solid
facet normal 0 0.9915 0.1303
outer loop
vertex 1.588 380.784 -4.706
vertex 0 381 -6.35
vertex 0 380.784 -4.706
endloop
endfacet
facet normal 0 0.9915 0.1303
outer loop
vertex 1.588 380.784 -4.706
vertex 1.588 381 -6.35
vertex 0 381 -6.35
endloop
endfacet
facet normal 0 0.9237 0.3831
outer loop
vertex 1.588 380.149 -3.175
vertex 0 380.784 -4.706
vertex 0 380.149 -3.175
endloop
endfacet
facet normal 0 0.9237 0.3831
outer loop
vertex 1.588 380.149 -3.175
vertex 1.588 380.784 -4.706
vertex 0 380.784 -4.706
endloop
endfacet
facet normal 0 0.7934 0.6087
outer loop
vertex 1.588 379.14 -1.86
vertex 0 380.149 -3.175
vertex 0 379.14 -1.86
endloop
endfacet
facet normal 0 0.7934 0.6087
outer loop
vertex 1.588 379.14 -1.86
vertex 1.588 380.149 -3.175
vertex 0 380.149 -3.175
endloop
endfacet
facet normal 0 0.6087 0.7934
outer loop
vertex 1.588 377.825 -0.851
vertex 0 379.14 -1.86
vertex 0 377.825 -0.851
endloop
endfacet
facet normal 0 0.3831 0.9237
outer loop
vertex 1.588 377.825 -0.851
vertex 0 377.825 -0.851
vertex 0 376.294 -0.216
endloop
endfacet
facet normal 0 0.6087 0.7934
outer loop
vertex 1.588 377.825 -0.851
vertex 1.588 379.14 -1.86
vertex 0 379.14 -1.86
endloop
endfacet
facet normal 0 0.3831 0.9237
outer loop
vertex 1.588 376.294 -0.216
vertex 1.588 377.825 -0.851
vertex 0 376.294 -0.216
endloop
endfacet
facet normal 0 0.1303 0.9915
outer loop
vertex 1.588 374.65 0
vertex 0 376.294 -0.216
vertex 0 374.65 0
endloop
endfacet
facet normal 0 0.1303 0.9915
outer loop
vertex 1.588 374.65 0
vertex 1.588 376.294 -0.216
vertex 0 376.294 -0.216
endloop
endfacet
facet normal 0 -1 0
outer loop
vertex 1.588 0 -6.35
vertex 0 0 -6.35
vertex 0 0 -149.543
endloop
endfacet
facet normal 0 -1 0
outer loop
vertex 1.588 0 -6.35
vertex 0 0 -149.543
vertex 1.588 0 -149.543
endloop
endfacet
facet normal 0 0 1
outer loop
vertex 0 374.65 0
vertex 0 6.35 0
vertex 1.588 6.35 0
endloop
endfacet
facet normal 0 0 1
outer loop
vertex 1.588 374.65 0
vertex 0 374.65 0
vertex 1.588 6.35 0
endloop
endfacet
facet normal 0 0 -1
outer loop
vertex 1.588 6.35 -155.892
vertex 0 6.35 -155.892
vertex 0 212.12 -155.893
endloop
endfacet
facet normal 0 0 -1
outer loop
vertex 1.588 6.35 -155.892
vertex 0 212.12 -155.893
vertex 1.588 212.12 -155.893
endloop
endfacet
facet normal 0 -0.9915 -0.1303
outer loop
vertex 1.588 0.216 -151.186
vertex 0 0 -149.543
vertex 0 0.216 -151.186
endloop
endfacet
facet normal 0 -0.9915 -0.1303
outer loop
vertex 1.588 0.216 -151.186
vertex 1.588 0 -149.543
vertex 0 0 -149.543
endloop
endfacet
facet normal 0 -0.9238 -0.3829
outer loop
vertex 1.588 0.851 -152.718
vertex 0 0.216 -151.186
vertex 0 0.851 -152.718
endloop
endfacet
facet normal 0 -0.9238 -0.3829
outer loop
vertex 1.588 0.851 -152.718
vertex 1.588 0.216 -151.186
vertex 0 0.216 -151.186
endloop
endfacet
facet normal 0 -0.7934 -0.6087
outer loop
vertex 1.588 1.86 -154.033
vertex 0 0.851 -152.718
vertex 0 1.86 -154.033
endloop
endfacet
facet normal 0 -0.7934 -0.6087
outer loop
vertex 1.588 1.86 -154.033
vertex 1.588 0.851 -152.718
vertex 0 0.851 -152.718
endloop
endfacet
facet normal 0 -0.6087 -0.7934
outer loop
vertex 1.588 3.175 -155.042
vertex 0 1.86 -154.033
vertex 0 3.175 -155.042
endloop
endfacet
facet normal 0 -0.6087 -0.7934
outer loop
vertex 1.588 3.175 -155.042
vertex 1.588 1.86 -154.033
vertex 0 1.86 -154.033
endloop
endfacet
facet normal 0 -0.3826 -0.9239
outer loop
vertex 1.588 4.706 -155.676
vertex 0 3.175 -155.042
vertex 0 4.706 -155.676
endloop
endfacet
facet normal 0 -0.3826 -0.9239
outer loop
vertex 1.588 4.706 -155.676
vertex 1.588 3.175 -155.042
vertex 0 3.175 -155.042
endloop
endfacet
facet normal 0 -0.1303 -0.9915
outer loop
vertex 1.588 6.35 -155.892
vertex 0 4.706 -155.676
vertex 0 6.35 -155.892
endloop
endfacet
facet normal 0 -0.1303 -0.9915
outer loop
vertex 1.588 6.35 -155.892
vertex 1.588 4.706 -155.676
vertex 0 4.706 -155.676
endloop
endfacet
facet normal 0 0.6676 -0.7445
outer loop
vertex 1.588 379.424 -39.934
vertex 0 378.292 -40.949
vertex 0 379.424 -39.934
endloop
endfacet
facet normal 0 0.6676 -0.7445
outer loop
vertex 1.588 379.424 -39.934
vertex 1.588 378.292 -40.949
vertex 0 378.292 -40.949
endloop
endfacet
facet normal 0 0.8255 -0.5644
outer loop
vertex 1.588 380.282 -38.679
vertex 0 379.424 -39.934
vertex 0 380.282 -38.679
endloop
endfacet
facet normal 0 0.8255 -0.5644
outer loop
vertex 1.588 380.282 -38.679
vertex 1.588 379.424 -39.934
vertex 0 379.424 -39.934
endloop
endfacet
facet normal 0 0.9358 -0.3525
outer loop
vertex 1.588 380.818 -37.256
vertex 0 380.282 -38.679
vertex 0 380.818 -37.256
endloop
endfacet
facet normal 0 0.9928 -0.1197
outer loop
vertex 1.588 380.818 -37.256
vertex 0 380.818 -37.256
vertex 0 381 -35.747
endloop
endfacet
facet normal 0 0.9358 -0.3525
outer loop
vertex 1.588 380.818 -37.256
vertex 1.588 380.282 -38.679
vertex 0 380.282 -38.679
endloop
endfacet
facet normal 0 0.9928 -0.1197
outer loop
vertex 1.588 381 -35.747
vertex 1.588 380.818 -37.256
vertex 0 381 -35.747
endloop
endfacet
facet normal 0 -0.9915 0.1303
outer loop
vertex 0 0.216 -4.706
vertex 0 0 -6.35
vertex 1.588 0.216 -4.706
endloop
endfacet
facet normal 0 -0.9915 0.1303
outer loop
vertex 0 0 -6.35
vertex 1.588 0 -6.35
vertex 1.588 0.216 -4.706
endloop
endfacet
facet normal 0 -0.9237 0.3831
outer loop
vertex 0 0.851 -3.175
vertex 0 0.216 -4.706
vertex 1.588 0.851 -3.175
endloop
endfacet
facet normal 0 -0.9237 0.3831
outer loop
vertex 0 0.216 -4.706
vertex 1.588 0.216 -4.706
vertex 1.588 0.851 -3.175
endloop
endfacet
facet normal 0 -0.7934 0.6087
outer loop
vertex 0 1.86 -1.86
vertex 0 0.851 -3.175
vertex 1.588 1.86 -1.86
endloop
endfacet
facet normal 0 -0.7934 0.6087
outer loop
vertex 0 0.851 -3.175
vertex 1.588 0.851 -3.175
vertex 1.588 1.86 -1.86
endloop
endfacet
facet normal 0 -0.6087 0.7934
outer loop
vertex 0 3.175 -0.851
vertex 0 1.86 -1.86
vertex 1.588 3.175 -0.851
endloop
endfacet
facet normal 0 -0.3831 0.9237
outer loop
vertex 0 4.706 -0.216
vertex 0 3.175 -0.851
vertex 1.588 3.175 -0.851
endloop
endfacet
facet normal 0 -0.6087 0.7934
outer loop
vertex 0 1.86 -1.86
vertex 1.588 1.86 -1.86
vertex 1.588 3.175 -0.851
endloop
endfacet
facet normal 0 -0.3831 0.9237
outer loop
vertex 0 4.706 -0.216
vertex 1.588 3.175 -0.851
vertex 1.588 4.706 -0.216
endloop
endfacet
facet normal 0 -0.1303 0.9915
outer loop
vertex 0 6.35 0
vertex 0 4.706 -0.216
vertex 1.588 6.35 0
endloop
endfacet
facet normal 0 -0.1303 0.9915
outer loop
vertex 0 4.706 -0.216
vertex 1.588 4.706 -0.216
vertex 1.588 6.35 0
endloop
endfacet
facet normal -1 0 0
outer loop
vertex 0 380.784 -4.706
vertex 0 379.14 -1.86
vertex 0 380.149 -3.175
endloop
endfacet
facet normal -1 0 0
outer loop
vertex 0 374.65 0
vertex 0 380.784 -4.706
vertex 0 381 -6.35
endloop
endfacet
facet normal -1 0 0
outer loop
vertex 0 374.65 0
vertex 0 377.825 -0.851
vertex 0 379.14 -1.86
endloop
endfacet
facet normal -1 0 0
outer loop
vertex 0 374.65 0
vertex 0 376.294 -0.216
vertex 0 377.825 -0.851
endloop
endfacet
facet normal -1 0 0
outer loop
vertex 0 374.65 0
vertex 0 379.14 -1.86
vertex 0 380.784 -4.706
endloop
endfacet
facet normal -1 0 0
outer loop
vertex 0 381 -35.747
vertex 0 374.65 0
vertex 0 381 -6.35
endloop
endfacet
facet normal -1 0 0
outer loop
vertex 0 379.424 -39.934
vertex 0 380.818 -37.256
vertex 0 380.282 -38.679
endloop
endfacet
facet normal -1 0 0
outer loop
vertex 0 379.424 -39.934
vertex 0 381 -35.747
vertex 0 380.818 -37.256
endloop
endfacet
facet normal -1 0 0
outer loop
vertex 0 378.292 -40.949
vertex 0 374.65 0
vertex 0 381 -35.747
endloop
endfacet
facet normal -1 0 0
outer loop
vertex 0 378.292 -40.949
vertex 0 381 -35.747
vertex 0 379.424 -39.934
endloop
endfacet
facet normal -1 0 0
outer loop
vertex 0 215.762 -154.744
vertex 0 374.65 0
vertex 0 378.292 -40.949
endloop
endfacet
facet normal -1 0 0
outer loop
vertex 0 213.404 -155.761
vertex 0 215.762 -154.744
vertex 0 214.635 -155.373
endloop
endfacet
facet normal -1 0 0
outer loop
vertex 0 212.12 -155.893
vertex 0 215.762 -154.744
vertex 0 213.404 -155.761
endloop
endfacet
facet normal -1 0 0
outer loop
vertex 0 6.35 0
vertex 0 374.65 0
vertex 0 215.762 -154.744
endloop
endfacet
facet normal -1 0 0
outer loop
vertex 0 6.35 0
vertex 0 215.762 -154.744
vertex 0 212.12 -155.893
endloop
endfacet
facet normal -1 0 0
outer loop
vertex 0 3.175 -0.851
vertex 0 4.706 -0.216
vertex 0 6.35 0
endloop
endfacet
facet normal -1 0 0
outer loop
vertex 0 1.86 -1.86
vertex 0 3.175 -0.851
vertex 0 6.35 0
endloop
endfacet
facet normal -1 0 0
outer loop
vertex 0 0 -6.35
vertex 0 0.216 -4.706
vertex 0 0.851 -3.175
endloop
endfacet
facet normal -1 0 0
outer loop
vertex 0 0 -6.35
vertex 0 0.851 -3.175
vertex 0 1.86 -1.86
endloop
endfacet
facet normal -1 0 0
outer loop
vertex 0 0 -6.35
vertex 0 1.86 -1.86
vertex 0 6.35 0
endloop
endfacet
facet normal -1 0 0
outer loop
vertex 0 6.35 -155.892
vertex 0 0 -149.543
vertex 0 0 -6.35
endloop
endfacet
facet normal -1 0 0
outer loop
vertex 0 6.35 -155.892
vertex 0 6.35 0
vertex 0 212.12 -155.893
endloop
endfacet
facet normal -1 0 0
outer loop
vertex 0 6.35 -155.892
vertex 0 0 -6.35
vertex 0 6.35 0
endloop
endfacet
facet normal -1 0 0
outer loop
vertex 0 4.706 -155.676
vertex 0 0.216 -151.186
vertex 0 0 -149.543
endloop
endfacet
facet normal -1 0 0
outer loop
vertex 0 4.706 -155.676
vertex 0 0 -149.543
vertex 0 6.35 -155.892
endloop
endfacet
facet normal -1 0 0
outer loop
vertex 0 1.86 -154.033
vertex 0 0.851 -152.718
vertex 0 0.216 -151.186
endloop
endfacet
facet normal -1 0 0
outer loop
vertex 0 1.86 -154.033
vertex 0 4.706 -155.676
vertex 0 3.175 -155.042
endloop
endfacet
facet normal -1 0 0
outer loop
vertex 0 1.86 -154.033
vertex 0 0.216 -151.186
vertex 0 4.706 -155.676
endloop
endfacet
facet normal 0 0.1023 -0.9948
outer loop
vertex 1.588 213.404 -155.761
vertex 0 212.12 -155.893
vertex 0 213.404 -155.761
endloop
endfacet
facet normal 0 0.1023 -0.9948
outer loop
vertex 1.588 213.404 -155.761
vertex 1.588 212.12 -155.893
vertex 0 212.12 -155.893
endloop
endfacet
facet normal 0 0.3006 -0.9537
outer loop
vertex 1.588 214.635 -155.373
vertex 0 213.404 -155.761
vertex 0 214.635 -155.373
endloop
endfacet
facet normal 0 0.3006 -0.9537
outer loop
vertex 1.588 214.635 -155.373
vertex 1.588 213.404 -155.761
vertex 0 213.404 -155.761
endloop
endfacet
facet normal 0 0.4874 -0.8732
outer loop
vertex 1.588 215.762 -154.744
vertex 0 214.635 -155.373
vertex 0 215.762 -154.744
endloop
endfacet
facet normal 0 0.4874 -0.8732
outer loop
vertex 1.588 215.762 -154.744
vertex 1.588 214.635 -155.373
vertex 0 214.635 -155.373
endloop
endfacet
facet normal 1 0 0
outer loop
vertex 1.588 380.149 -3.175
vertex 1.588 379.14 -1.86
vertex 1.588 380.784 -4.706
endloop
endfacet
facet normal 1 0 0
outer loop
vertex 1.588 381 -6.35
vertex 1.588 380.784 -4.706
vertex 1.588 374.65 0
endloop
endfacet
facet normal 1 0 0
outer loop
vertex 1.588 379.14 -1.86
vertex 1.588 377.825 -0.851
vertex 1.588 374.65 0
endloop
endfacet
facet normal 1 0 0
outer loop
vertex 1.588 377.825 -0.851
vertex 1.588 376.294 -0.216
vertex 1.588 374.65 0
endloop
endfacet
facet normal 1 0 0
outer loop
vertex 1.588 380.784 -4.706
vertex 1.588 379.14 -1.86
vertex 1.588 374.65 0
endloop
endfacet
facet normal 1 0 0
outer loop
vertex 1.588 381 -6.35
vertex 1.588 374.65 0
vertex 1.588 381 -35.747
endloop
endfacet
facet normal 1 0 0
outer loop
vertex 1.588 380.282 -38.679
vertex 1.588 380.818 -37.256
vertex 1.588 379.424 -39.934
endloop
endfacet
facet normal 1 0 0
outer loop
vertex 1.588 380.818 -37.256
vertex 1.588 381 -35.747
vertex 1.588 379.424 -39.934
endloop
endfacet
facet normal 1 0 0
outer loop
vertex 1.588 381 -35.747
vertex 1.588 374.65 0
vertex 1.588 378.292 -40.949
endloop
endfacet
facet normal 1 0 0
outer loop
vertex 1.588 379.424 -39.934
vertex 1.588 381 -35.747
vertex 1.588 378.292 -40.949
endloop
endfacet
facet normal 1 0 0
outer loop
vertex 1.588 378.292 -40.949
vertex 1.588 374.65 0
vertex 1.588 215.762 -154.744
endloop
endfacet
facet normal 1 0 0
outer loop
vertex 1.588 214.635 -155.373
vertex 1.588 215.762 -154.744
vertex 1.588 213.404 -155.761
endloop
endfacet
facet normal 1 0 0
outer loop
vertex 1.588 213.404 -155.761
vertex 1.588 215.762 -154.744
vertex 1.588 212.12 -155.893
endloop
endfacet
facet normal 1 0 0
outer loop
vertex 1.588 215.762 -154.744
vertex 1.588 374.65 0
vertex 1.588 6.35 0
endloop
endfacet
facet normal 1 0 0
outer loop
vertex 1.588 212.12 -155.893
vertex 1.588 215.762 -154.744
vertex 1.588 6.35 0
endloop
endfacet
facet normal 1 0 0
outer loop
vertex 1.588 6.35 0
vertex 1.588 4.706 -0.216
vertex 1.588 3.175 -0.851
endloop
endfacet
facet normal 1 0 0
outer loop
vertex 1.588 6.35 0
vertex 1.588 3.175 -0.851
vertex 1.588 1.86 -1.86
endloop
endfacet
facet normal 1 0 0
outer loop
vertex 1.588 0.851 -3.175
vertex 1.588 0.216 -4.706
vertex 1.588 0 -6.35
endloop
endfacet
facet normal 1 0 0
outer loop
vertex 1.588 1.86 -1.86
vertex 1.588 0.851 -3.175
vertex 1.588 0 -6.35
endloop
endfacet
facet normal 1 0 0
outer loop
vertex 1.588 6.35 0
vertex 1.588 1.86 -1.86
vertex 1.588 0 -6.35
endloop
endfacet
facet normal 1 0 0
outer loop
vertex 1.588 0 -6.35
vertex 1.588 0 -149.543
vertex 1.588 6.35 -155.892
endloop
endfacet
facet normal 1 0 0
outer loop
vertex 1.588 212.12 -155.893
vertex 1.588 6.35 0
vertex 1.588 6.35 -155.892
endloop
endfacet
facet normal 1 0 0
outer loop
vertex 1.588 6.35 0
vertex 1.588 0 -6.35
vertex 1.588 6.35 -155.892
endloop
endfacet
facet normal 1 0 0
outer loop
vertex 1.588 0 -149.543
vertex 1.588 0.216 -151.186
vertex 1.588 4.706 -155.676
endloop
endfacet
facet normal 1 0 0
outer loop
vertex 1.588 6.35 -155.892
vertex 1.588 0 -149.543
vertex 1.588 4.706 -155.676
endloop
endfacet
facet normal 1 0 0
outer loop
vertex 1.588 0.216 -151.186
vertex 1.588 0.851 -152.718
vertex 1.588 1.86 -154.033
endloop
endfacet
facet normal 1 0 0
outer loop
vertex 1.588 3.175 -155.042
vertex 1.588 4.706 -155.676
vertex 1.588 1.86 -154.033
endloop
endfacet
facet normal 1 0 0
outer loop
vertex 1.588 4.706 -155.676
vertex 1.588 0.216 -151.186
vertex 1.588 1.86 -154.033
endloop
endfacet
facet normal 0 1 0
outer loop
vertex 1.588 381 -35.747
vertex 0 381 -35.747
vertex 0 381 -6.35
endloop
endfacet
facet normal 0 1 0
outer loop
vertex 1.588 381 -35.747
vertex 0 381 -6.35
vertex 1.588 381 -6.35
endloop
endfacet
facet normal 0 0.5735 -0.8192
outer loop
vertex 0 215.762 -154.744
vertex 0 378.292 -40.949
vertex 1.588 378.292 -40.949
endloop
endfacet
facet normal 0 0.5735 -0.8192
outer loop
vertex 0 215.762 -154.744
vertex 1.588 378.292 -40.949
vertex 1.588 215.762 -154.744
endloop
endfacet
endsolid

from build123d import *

# Parameters (mm, degrees)
SKETCH1_W           = 1.5875
SKETCH1_H           = 155.8925
BOSS_EXTRUDE1_DEPTH = 381
CUT_EXTRUDE1_DEPTH  = 1.5875
FILLET1_R           = 6.35


with BuildPart() as part:
    # Sketch1 → Boss-Extrude1 (new body)
    with BuildSketch(Plane(origin=(0, 0, 0), x_dir=(1, 0, 0), z_dir=(0, 1, 0))):
        with Locations((0.79375, 77.94625)):
            Rectangle(SKETCH1_W, SKETCH1_H)
    extrude(amount=BOSS_EXTRUDE1_DEPTH)

    # Sketch2 → Cut-Extrude1 (cut)
    with BuildSketch(Plane.ZY):
        Polygon((-39.0525, 381), (-155.8925, 214.122), (-155.8925, 381), align=None)
    extrude(amount=-CUT_EXTRUDE1_DEPTH, mode=Mode.SUBTRACT)

    # Fillet1
    fillet1_edges = [part.edges().sort_by_distance(p)[0] for p in [
        (0.79375, 381, -39.0525),
        (0.79375, 214.122, -155.8925),
        (0.79375, 381, 0),
        (0.79375, 0, -155.8925),
        (0.79375, 0, 0),
    ]]
    fillet(fillet1_edges, radius=FILLET1_R)


solid = part.part
